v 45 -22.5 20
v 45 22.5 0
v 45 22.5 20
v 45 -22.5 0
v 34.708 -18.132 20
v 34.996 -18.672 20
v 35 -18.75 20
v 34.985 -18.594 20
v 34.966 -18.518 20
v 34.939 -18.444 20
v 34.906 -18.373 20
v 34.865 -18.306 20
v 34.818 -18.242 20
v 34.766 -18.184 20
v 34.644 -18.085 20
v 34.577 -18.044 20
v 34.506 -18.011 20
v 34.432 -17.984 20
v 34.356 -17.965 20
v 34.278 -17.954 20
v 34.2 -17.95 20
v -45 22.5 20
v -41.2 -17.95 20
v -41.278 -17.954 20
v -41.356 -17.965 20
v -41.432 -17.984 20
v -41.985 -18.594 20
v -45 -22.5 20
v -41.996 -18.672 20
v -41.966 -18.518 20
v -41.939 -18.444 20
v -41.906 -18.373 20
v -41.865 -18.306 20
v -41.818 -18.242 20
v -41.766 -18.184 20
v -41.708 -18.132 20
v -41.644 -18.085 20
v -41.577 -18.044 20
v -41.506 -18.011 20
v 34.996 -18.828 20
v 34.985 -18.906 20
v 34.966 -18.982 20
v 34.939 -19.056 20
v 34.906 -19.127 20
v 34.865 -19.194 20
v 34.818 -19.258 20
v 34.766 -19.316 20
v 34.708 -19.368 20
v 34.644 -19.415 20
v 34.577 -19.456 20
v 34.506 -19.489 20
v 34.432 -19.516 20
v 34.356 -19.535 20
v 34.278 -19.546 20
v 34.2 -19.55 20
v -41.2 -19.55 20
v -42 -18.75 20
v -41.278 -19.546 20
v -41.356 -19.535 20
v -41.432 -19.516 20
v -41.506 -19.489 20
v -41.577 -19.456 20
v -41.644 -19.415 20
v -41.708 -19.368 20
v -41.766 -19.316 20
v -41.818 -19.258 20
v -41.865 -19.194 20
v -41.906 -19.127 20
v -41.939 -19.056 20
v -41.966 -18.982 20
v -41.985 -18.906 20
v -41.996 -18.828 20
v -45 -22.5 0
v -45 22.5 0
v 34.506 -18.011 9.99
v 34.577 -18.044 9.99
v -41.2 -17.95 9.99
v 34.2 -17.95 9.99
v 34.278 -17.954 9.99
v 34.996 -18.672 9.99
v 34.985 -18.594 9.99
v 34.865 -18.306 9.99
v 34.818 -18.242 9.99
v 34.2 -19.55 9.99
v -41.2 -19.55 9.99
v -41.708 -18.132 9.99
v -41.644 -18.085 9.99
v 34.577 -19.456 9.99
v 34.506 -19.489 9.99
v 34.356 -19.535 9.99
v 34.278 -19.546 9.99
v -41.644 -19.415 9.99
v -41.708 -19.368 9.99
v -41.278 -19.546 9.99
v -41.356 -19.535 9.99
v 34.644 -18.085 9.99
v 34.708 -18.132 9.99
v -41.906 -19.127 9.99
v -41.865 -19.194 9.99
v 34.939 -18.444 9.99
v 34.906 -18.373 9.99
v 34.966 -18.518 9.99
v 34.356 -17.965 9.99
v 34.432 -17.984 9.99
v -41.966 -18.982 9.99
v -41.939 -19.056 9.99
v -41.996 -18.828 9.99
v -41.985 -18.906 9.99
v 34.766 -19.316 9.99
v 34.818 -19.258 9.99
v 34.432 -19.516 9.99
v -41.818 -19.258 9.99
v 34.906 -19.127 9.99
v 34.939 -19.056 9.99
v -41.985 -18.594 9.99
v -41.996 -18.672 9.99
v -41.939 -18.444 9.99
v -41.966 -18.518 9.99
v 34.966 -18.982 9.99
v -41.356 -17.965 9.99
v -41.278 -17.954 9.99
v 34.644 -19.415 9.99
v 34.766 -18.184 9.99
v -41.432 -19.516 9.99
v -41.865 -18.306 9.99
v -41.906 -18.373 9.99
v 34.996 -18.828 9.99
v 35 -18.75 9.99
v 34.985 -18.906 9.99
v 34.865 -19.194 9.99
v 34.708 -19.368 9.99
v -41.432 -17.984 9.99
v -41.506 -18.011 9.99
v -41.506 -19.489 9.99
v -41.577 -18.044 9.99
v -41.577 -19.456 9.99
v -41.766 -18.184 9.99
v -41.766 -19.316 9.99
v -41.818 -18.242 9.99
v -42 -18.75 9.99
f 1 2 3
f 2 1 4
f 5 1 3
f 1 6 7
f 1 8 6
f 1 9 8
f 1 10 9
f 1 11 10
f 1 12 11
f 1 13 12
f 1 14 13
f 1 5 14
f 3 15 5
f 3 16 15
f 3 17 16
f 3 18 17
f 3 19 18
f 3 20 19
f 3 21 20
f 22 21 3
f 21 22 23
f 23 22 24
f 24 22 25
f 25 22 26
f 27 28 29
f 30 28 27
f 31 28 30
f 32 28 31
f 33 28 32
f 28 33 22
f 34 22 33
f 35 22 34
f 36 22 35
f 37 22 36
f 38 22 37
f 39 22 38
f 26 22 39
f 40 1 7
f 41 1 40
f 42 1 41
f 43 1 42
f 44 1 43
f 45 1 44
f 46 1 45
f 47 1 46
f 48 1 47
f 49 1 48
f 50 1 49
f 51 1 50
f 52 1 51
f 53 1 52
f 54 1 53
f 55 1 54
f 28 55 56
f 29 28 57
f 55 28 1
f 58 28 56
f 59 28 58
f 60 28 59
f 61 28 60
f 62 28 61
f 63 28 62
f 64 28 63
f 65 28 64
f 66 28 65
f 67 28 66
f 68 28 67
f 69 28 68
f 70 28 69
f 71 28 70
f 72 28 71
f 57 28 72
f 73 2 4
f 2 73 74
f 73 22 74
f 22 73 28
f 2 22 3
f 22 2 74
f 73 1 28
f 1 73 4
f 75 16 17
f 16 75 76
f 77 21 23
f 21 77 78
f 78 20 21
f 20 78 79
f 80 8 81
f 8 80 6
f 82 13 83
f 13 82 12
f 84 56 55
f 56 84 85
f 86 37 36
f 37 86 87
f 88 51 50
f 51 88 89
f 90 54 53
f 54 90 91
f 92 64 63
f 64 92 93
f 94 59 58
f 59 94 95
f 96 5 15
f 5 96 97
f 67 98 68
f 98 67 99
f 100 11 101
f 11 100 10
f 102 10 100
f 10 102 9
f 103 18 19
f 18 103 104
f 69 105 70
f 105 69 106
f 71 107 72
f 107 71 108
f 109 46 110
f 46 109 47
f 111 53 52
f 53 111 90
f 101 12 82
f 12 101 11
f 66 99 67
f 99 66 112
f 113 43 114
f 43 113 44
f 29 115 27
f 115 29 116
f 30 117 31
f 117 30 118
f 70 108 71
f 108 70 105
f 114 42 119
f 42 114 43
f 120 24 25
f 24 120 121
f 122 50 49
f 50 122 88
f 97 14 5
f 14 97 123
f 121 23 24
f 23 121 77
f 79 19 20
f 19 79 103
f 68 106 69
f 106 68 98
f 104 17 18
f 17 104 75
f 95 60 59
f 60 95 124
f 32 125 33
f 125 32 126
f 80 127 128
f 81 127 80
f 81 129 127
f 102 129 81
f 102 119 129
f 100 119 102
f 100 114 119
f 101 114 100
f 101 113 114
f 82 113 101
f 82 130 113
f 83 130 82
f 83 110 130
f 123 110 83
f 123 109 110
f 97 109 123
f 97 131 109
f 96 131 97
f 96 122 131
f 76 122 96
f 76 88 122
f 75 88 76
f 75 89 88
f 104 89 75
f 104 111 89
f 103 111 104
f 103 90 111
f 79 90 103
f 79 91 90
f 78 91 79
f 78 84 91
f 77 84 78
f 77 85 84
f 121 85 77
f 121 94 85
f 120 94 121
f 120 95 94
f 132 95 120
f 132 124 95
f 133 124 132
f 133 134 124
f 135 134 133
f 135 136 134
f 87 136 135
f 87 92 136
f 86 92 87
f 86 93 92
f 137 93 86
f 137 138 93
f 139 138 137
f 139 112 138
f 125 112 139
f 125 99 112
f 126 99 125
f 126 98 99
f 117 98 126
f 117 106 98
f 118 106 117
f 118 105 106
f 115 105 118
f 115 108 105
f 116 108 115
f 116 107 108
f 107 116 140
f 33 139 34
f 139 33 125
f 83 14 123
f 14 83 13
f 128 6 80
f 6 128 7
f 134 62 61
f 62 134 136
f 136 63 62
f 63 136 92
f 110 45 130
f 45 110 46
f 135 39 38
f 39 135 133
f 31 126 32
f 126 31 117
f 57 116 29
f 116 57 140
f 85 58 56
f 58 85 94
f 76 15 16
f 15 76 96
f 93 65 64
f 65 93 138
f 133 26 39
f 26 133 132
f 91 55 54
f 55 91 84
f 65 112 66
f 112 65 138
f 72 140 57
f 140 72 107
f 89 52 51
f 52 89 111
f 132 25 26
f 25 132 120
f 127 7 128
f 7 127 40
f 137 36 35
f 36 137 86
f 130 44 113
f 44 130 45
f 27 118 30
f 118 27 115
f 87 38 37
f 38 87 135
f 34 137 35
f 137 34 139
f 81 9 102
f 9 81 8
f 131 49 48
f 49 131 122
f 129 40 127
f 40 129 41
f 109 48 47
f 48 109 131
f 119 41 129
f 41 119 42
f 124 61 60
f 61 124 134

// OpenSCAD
// Built by bench/smallmodels/features/compiler.py from a list of features.
$fn = 64;
difference() {
  union() {
    translate([0, 0, 0]) translate([-45, -22.5, 0]) cube([90, 45, 20]);
  }
  union() {
    translate([-3.5, -18.75, 9.99]) rotate([0, 0, 0]) hull() { for (s = [-1, 1]) translate([s * 37.7, 0, 0]) cylinder(d = 1.6, h = 10.02); }
  }
}
